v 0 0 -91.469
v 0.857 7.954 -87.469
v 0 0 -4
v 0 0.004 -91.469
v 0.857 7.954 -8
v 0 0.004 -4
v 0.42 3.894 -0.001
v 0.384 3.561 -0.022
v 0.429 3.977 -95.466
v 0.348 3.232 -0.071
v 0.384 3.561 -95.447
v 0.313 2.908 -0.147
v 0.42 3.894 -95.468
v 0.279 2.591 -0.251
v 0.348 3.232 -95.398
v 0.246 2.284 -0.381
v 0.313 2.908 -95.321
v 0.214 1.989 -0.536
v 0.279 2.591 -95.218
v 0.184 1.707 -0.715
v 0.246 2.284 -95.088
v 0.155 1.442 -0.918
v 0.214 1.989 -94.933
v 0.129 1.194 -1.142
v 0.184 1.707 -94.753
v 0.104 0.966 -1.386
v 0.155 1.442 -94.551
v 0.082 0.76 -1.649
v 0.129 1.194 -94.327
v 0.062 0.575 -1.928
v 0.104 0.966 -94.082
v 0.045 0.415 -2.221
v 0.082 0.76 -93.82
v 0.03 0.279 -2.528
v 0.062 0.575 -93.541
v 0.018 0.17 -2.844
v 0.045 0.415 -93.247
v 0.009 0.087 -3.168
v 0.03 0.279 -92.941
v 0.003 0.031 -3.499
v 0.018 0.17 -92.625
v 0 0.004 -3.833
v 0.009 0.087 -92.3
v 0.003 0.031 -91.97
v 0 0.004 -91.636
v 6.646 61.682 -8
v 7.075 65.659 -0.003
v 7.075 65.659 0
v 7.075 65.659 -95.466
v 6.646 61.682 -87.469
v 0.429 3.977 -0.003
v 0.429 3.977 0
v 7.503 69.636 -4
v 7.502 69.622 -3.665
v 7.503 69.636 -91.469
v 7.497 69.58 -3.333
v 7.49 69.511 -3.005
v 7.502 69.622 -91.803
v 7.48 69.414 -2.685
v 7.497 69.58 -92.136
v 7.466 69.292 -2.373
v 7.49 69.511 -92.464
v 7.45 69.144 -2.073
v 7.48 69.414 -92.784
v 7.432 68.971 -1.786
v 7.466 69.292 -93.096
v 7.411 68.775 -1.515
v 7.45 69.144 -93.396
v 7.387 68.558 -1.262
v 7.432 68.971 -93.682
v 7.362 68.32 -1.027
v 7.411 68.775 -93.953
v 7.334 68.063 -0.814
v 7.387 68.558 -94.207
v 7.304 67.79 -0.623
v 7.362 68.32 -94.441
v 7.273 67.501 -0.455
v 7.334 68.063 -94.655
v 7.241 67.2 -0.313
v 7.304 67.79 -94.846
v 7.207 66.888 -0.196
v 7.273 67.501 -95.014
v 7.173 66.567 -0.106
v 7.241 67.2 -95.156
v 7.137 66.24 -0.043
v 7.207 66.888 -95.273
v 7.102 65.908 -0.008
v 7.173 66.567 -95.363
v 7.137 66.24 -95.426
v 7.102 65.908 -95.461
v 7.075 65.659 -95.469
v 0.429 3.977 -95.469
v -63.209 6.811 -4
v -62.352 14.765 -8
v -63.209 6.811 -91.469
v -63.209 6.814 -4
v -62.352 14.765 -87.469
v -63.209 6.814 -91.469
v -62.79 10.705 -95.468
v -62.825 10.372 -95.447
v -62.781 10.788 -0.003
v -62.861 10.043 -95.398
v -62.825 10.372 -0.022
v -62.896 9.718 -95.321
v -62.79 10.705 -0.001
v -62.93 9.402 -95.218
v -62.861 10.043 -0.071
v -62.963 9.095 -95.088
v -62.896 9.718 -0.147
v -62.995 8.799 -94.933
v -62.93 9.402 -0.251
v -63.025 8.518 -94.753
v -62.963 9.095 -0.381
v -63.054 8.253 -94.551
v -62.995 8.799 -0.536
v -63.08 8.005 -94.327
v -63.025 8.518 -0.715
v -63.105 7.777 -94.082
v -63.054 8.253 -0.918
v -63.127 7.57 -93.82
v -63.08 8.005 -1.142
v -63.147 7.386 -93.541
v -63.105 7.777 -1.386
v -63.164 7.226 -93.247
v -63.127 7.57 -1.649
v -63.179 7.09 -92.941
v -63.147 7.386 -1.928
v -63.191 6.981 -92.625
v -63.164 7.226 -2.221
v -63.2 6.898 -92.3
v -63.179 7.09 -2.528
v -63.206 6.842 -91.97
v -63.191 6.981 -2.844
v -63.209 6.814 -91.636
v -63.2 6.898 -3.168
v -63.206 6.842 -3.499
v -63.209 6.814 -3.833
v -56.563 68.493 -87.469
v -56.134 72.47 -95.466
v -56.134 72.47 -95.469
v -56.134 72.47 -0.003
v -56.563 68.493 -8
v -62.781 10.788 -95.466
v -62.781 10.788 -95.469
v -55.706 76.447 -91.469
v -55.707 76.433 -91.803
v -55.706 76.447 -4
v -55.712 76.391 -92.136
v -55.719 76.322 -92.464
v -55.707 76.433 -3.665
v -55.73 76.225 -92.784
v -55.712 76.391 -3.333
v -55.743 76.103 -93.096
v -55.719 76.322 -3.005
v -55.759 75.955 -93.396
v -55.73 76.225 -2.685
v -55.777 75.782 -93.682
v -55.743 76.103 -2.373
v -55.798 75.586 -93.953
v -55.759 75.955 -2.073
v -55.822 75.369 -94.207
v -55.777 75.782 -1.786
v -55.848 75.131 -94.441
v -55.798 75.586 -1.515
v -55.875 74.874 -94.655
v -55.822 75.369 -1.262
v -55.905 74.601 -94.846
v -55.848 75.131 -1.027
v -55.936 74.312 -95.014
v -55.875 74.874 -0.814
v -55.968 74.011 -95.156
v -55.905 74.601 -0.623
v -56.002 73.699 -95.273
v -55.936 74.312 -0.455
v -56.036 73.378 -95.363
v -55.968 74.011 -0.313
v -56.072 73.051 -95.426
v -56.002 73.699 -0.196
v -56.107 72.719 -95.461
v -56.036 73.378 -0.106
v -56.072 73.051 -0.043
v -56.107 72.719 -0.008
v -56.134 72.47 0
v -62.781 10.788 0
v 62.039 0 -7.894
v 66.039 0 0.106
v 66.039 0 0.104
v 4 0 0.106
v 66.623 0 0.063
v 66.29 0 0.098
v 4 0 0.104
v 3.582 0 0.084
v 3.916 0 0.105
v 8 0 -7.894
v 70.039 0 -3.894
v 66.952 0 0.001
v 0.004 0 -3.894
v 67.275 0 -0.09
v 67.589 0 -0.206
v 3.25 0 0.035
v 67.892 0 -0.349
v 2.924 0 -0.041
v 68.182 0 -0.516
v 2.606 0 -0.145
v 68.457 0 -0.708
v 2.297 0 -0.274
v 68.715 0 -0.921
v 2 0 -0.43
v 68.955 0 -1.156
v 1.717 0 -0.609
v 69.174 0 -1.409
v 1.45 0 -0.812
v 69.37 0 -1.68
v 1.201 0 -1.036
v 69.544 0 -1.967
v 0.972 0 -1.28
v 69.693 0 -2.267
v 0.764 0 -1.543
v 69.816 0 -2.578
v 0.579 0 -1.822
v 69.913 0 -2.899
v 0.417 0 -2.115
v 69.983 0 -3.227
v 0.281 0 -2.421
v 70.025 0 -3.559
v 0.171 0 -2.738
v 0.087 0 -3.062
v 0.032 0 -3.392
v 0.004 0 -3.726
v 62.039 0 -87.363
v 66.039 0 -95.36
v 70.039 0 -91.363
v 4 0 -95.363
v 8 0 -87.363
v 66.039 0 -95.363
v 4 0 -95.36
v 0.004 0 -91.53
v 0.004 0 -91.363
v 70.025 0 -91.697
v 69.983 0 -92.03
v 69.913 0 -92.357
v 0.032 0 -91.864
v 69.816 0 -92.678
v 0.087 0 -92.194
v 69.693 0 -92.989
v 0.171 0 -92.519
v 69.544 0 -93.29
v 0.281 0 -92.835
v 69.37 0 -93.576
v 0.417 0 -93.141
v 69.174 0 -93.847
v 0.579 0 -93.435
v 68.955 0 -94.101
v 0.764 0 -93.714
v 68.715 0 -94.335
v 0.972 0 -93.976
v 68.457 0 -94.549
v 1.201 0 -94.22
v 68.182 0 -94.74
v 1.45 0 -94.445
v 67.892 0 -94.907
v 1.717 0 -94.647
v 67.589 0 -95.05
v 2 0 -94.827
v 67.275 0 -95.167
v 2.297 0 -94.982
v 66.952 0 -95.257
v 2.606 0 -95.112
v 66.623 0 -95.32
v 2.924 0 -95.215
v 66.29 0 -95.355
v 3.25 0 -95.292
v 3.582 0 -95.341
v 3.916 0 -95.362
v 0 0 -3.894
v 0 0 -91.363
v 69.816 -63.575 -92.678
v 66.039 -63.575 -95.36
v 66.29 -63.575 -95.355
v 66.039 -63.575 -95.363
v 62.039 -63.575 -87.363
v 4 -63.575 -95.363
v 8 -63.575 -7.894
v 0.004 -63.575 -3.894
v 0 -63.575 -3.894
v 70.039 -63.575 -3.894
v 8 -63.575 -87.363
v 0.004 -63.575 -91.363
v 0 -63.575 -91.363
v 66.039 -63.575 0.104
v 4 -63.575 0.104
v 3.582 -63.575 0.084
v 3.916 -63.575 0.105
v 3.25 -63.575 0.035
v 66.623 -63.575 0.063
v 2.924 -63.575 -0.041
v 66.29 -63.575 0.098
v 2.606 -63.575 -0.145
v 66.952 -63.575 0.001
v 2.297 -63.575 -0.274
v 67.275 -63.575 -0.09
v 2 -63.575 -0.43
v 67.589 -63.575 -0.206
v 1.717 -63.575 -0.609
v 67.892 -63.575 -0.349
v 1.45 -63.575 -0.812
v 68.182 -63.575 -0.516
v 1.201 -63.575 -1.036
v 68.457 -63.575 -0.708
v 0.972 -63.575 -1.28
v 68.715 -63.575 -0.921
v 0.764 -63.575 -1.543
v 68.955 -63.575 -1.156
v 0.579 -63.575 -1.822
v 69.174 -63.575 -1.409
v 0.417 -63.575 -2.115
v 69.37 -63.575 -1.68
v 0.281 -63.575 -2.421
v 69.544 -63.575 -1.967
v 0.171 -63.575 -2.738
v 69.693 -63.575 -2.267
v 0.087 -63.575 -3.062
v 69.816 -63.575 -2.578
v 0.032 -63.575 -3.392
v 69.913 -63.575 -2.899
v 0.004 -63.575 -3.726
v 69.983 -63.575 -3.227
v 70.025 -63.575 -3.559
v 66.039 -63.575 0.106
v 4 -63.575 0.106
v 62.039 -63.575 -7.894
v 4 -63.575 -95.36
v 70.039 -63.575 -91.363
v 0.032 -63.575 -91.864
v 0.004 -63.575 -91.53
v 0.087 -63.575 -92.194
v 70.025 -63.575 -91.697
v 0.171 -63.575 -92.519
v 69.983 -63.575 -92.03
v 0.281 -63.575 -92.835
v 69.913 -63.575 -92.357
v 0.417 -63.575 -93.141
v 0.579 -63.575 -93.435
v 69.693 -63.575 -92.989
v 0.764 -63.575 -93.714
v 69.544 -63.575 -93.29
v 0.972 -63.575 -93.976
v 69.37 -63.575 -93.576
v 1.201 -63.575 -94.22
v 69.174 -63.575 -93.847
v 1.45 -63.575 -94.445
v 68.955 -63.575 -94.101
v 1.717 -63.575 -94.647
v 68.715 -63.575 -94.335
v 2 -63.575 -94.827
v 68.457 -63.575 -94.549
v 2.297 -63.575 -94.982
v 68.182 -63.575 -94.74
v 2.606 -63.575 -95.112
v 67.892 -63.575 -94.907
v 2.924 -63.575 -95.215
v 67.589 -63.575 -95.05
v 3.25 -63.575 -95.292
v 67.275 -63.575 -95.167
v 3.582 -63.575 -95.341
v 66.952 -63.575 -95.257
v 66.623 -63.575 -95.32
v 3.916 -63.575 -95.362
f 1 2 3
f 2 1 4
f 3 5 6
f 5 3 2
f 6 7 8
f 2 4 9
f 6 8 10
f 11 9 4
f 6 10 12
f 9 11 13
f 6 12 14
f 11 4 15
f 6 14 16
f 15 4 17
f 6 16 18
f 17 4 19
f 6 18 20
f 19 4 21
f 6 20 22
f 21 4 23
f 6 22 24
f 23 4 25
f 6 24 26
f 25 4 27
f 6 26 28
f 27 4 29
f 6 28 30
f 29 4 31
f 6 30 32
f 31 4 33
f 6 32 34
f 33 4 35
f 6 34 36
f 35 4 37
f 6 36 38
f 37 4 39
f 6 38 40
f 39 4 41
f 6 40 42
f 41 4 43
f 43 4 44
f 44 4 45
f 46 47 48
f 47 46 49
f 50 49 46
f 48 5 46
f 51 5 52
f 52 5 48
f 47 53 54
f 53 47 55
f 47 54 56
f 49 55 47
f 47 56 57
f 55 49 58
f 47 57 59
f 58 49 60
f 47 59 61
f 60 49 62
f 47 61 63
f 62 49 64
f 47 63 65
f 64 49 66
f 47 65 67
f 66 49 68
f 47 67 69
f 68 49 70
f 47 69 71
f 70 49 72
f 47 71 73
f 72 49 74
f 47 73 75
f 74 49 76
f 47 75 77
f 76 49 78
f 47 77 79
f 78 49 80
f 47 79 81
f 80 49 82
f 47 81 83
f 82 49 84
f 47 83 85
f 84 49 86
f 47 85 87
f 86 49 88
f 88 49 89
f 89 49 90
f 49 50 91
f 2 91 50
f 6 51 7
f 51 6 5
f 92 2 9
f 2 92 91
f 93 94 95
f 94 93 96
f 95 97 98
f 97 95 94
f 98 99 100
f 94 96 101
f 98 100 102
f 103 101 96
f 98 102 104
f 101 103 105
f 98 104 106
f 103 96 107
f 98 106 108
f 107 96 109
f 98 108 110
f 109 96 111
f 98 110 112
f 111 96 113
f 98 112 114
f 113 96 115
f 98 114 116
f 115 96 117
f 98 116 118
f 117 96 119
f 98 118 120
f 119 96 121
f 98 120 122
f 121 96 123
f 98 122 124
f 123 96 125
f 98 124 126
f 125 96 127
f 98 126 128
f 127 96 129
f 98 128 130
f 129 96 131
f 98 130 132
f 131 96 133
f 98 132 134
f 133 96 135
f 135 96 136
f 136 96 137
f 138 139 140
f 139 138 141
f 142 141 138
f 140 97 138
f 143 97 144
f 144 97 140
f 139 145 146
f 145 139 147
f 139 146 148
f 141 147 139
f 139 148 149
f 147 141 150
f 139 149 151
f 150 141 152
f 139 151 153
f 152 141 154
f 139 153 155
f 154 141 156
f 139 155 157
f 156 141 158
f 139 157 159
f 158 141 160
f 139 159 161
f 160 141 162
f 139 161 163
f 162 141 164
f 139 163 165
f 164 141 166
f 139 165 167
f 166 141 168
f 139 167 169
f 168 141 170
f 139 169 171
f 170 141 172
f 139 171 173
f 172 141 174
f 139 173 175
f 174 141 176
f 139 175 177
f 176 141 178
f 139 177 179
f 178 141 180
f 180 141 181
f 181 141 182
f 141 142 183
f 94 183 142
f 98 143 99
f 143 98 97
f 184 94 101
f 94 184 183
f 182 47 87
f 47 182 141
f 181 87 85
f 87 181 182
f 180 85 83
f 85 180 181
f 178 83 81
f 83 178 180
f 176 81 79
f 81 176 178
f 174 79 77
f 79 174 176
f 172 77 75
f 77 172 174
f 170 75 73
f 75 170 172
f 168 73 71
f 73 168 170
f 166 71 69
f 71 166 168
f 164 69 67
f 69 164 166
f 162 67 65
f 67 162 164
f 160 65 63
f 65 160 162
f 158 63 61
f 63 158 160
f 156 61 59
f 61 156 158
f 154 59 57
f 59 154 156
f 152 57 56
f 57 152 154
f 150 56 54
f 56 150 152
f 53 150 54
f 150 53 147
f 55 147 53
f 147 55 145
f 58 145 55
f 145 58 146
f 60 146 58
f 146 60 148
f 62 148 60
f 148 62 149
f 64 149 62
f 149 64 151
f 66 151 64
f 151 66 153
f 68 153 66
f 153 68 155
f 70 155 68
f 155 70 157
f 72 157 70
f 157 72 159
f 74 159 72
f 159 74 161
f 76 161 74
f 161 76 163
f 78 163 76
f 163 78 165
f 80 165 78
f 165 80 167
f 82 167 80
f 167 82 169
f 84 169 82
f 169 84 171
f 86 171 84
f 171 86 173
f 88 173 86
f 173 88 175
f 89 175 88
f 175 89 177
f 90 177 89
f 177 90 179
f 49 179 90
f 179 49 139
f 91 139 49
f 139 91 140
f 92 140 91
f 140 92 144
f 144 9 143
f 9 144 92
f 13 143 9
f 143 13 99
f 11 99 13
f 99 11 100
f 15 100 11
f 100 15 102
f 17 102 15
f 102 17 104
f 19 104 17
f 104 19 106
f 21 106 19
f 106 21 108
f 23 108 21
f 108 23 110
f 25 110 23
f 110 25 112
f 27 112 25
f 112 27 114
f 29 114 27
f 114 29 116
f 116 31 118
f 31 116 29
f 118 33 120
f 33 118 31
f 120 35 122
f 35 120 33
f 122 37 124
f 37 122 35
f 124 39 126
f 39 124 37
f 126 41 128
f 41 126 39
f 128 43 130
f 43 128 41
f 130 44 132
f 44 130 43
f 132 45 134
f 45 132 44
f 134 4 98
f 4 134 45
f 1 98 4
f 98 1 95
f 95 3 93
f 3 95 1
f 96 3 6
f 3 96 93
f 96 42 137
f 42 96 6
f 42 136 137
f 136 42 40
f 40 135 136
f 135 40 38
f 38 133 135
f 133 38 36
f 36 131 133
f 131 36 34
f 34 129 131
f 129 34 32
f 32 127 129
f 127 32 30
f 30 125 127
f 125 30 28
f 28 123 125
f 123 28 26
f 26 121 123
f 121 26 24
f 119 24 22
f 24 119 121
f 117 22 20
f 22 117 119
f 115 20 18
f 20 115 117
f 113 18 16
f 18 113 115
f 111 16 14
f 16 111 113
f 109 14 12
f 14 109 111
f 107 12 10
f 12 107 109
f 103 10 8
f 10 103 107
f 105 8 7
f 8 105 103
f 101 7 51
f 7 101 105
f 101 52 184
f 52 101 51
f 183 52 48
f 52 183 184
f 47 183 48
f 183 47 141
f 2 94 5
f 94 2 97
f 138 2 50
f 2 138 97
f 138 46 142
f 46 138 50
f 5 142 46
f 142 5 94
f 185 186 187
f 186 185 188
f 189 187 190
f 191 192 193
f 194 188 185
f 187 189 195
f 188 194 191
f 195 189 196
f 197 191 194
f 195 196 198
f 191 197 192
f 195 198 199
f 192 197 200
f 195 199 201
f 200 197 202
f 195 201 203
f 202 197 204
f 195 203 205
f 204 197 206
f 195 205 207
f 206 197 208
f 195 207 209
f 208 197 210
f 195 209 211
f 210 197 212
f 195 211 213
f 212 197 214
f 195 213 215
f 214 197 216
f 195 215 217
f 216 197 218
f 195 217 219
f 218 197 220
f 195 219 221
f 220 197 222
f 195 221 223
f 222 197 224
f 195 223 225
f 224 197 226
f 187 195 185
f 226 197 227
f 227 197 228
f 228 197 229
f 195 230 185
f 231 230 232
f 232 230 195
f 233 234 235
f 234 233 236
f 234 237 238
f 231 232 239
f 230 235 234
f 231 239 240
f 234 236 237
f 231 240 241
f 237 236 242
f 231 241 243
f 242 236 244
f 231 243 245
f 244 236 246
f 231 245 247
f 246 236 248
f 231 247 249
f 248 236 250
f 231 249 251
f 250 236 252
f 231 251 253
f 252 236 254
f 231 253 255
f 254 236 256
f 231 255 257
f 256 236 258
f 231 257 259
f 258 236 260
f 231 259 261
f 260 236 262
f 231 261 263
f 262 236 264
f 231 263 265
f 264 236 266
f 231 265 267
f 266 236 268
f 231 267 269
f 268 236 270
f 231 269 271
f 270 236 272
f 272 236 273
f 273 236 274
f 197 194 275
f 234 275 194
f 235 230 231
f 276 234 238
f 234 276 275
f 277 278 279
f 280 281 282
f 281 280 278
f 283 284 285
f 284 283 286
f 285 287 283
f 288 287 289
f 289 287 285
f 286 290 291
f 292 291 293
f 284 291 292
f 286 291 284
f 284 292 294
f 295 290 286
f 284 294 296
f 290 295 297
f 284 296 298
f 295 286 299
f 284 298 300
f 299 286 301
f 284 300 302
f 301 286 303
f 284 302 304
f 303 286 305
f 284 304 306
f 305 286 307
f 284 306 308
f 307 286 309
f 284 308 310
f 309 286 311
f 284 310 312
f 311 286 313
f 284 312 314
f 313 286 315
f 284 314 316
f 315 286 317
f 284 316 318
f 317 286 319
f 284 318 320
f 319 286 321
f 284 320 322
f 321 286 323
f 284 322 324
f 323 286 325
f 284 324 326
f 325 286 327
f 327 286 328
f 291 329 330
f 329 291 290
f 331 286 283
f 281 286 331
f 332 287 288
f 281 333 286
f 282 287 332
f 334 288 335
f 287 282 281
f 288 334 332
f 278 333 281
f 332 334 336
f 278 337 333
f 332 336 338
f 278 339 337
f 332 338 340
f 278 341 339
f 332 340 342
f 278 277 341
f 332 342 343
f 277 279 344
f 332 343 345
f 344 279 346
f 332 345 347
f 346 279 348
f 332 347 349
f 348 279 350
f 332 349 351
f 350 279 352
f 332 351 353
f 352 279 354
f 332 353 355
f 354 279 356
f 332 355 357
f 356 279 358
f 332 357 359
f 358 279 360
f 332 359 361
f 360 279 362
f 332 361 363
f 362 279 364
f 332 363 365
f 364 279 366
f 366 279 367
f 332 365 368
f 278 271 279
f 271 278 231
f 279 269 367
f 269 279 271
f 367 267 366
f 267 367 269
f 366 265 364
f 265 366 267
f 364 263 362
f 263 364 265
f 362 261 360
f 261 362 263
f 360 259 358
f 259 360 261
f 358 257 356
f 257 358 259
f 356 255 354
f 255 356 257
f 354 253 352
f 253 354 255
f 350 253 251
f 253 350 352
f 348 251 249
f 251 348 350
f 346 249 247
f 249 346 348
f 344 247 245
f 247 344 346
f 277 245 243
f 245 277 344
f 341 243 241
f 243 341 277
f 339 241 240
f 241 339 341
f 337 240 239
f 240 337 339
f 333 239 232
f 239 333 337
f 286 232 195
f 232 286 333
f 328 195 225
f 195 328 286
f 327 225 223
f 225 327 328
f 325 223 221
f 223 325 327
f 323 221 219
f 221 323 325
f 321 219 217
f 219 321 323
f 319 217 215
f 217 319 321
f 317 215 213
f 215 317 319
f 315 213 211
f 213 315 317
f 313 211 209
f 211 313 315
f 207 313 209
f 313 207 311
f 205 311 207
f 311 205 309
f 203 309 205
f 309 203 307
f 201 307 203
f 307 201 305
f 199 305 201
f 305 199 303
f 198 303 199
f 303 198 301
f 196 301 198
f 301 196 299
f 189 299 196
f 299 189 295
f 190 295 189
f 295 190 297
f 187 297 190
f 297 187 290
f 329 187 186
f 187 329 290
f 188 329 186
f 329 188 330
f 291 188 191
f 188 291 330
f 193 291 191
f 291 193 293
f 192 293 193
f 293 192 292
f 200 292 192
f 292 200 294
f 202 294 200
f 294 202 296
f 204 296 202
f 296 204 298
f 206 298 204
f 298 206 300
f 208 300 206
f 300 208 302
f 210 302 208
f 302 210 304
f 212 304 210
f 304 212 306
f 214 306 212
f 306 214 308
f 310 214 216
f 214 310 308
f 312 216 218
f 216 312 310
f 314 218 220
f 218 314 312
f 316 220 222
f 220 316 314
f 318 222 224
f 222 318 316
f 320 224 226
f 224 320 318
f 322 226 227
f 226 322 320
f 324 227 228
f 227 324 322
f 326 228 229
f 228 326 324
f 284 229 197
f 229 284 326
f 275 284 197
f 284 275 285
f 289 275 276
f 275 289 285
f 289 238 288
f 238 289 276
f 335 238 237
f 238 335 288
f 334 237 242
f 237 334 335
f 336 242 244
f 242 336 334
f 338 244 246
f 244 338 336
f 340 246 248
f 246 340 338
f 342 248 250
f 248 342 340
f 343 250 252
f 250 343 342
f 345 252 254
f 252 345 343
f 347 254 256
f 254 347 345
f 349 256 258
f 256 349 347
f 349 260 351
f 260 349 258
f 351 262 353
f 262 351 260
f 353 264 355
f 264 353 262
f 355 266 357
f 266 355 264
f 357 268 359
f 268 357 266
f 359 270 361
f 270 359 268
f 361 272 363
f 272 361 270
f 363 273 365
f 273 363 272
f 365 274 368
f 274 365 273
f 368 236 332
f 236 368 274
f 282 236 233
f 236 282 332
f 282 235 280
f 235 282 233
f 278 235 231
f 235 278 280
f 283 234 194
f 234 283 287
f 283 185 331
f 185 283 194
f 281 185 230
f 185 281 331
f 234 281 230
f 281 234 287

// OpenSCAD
//outside dimensions of the box

// eavestrough mouth dimensions.
width_in  = 2.125;    //x dimension
length_in = 3.125;    //y dimension

straight_run = 2.5;  // make it a few feet ha ha

/* [Hidden] */
$fn= $preview ? 50 : 75;

MM = 25.43;

width_mm = width_in * MM;
length_mm = length_in * MM;
straight_run_mm = straight_run * MM;

tilt = 6.15; //below 90 degrees

//additional parameters
wall_thickness = 4;

module mark() 
{
    if ($preview)  cylinder(h=10, r1 =2, r2=1);
}
//==============================================================
module my_iterator(angle = 0, length = 0)
{
    echo ("my_iterator has ", $children, "children" );
    
    if (angle != 0)
    {
        echo ("elbow requested has ", $children, "children" );
        for ( i = [0, $children - 1])
            rotate_extrude( angle= 90 - tilt)
            {
                children(i);
            }
            mark();
     }
     else if ( length != 0)
     {
        echo ("tube requested has ", $children, "children" );
        for ( i = [0, $children - 1])
            linear_extrude(height= length)
            //linear_extrude()
            {
                children(i);
            }
            mark();
     }
     else 
     {
        assert(1, "need angle or length");
     }
     echo ("angle =", angle, "length = ", length);
     echo (" ");
}


module make_2D_template() 
{
    x= width_mm / 2 + wall_thickness;
    y= length_mm /2 + wall_thickness;
    h= straight_run_mm;
    r = wall_thickness;
    z = 0;
    translate([ x + r , y  +r , 0])

    union()
    {
        translate([x,y,z]){         // move post to this location
            circle(r); // make one post
            translate([-x *2, -r, 0 ])
            color("RED")
            square([ x * 2 , r * 2]);
        }
        translate([-x,y,z]){        // move post to this location
            circle(r); // make one post
            rotate([0, 0, -90])
            translate([0, -r, 0 ])
            color("BLUE")
            square([ y * 2 , r * 2]);
        }   
        translate([-x,-y,z]){       // move post to this location
            circle(r); // make one post
            translate([0, -r, 0 ])
            color("CYAN")
            square([ x * 2 , r * 2]);
        }
        translate([x,-y,z]){        // move post to this location
            circle(r); // make one post
            rotate([0, 0, 90])
            translate([0, -r, 0 ])
            color("ORANGE")
            square([ y * 2 , r * 2]);
        }
   }
        
}

//========= main ==========================================================

{

    color("CYAN")
    rotate([-90, 0, 90 - tilt])
    my_iterator(length = straight_run_mm)
       make_2D_template();

    
    color("GREEN")
    translate([ 0, 0, -straight_run_mm * 3/2]) // move from center to axis. move from axis entirely to negative axis
    rotate([90, 0, 0])
    my_iterator(length = straight_run_mm)
       make_2D_template();

    color("RED")
    translate([0, 0, -straight_run_mm * 3/2]) // move from center to axis. move from axis entirely to negative axis
    my_iterator(angle = tilt)
        make_2D_template();
}    
    
